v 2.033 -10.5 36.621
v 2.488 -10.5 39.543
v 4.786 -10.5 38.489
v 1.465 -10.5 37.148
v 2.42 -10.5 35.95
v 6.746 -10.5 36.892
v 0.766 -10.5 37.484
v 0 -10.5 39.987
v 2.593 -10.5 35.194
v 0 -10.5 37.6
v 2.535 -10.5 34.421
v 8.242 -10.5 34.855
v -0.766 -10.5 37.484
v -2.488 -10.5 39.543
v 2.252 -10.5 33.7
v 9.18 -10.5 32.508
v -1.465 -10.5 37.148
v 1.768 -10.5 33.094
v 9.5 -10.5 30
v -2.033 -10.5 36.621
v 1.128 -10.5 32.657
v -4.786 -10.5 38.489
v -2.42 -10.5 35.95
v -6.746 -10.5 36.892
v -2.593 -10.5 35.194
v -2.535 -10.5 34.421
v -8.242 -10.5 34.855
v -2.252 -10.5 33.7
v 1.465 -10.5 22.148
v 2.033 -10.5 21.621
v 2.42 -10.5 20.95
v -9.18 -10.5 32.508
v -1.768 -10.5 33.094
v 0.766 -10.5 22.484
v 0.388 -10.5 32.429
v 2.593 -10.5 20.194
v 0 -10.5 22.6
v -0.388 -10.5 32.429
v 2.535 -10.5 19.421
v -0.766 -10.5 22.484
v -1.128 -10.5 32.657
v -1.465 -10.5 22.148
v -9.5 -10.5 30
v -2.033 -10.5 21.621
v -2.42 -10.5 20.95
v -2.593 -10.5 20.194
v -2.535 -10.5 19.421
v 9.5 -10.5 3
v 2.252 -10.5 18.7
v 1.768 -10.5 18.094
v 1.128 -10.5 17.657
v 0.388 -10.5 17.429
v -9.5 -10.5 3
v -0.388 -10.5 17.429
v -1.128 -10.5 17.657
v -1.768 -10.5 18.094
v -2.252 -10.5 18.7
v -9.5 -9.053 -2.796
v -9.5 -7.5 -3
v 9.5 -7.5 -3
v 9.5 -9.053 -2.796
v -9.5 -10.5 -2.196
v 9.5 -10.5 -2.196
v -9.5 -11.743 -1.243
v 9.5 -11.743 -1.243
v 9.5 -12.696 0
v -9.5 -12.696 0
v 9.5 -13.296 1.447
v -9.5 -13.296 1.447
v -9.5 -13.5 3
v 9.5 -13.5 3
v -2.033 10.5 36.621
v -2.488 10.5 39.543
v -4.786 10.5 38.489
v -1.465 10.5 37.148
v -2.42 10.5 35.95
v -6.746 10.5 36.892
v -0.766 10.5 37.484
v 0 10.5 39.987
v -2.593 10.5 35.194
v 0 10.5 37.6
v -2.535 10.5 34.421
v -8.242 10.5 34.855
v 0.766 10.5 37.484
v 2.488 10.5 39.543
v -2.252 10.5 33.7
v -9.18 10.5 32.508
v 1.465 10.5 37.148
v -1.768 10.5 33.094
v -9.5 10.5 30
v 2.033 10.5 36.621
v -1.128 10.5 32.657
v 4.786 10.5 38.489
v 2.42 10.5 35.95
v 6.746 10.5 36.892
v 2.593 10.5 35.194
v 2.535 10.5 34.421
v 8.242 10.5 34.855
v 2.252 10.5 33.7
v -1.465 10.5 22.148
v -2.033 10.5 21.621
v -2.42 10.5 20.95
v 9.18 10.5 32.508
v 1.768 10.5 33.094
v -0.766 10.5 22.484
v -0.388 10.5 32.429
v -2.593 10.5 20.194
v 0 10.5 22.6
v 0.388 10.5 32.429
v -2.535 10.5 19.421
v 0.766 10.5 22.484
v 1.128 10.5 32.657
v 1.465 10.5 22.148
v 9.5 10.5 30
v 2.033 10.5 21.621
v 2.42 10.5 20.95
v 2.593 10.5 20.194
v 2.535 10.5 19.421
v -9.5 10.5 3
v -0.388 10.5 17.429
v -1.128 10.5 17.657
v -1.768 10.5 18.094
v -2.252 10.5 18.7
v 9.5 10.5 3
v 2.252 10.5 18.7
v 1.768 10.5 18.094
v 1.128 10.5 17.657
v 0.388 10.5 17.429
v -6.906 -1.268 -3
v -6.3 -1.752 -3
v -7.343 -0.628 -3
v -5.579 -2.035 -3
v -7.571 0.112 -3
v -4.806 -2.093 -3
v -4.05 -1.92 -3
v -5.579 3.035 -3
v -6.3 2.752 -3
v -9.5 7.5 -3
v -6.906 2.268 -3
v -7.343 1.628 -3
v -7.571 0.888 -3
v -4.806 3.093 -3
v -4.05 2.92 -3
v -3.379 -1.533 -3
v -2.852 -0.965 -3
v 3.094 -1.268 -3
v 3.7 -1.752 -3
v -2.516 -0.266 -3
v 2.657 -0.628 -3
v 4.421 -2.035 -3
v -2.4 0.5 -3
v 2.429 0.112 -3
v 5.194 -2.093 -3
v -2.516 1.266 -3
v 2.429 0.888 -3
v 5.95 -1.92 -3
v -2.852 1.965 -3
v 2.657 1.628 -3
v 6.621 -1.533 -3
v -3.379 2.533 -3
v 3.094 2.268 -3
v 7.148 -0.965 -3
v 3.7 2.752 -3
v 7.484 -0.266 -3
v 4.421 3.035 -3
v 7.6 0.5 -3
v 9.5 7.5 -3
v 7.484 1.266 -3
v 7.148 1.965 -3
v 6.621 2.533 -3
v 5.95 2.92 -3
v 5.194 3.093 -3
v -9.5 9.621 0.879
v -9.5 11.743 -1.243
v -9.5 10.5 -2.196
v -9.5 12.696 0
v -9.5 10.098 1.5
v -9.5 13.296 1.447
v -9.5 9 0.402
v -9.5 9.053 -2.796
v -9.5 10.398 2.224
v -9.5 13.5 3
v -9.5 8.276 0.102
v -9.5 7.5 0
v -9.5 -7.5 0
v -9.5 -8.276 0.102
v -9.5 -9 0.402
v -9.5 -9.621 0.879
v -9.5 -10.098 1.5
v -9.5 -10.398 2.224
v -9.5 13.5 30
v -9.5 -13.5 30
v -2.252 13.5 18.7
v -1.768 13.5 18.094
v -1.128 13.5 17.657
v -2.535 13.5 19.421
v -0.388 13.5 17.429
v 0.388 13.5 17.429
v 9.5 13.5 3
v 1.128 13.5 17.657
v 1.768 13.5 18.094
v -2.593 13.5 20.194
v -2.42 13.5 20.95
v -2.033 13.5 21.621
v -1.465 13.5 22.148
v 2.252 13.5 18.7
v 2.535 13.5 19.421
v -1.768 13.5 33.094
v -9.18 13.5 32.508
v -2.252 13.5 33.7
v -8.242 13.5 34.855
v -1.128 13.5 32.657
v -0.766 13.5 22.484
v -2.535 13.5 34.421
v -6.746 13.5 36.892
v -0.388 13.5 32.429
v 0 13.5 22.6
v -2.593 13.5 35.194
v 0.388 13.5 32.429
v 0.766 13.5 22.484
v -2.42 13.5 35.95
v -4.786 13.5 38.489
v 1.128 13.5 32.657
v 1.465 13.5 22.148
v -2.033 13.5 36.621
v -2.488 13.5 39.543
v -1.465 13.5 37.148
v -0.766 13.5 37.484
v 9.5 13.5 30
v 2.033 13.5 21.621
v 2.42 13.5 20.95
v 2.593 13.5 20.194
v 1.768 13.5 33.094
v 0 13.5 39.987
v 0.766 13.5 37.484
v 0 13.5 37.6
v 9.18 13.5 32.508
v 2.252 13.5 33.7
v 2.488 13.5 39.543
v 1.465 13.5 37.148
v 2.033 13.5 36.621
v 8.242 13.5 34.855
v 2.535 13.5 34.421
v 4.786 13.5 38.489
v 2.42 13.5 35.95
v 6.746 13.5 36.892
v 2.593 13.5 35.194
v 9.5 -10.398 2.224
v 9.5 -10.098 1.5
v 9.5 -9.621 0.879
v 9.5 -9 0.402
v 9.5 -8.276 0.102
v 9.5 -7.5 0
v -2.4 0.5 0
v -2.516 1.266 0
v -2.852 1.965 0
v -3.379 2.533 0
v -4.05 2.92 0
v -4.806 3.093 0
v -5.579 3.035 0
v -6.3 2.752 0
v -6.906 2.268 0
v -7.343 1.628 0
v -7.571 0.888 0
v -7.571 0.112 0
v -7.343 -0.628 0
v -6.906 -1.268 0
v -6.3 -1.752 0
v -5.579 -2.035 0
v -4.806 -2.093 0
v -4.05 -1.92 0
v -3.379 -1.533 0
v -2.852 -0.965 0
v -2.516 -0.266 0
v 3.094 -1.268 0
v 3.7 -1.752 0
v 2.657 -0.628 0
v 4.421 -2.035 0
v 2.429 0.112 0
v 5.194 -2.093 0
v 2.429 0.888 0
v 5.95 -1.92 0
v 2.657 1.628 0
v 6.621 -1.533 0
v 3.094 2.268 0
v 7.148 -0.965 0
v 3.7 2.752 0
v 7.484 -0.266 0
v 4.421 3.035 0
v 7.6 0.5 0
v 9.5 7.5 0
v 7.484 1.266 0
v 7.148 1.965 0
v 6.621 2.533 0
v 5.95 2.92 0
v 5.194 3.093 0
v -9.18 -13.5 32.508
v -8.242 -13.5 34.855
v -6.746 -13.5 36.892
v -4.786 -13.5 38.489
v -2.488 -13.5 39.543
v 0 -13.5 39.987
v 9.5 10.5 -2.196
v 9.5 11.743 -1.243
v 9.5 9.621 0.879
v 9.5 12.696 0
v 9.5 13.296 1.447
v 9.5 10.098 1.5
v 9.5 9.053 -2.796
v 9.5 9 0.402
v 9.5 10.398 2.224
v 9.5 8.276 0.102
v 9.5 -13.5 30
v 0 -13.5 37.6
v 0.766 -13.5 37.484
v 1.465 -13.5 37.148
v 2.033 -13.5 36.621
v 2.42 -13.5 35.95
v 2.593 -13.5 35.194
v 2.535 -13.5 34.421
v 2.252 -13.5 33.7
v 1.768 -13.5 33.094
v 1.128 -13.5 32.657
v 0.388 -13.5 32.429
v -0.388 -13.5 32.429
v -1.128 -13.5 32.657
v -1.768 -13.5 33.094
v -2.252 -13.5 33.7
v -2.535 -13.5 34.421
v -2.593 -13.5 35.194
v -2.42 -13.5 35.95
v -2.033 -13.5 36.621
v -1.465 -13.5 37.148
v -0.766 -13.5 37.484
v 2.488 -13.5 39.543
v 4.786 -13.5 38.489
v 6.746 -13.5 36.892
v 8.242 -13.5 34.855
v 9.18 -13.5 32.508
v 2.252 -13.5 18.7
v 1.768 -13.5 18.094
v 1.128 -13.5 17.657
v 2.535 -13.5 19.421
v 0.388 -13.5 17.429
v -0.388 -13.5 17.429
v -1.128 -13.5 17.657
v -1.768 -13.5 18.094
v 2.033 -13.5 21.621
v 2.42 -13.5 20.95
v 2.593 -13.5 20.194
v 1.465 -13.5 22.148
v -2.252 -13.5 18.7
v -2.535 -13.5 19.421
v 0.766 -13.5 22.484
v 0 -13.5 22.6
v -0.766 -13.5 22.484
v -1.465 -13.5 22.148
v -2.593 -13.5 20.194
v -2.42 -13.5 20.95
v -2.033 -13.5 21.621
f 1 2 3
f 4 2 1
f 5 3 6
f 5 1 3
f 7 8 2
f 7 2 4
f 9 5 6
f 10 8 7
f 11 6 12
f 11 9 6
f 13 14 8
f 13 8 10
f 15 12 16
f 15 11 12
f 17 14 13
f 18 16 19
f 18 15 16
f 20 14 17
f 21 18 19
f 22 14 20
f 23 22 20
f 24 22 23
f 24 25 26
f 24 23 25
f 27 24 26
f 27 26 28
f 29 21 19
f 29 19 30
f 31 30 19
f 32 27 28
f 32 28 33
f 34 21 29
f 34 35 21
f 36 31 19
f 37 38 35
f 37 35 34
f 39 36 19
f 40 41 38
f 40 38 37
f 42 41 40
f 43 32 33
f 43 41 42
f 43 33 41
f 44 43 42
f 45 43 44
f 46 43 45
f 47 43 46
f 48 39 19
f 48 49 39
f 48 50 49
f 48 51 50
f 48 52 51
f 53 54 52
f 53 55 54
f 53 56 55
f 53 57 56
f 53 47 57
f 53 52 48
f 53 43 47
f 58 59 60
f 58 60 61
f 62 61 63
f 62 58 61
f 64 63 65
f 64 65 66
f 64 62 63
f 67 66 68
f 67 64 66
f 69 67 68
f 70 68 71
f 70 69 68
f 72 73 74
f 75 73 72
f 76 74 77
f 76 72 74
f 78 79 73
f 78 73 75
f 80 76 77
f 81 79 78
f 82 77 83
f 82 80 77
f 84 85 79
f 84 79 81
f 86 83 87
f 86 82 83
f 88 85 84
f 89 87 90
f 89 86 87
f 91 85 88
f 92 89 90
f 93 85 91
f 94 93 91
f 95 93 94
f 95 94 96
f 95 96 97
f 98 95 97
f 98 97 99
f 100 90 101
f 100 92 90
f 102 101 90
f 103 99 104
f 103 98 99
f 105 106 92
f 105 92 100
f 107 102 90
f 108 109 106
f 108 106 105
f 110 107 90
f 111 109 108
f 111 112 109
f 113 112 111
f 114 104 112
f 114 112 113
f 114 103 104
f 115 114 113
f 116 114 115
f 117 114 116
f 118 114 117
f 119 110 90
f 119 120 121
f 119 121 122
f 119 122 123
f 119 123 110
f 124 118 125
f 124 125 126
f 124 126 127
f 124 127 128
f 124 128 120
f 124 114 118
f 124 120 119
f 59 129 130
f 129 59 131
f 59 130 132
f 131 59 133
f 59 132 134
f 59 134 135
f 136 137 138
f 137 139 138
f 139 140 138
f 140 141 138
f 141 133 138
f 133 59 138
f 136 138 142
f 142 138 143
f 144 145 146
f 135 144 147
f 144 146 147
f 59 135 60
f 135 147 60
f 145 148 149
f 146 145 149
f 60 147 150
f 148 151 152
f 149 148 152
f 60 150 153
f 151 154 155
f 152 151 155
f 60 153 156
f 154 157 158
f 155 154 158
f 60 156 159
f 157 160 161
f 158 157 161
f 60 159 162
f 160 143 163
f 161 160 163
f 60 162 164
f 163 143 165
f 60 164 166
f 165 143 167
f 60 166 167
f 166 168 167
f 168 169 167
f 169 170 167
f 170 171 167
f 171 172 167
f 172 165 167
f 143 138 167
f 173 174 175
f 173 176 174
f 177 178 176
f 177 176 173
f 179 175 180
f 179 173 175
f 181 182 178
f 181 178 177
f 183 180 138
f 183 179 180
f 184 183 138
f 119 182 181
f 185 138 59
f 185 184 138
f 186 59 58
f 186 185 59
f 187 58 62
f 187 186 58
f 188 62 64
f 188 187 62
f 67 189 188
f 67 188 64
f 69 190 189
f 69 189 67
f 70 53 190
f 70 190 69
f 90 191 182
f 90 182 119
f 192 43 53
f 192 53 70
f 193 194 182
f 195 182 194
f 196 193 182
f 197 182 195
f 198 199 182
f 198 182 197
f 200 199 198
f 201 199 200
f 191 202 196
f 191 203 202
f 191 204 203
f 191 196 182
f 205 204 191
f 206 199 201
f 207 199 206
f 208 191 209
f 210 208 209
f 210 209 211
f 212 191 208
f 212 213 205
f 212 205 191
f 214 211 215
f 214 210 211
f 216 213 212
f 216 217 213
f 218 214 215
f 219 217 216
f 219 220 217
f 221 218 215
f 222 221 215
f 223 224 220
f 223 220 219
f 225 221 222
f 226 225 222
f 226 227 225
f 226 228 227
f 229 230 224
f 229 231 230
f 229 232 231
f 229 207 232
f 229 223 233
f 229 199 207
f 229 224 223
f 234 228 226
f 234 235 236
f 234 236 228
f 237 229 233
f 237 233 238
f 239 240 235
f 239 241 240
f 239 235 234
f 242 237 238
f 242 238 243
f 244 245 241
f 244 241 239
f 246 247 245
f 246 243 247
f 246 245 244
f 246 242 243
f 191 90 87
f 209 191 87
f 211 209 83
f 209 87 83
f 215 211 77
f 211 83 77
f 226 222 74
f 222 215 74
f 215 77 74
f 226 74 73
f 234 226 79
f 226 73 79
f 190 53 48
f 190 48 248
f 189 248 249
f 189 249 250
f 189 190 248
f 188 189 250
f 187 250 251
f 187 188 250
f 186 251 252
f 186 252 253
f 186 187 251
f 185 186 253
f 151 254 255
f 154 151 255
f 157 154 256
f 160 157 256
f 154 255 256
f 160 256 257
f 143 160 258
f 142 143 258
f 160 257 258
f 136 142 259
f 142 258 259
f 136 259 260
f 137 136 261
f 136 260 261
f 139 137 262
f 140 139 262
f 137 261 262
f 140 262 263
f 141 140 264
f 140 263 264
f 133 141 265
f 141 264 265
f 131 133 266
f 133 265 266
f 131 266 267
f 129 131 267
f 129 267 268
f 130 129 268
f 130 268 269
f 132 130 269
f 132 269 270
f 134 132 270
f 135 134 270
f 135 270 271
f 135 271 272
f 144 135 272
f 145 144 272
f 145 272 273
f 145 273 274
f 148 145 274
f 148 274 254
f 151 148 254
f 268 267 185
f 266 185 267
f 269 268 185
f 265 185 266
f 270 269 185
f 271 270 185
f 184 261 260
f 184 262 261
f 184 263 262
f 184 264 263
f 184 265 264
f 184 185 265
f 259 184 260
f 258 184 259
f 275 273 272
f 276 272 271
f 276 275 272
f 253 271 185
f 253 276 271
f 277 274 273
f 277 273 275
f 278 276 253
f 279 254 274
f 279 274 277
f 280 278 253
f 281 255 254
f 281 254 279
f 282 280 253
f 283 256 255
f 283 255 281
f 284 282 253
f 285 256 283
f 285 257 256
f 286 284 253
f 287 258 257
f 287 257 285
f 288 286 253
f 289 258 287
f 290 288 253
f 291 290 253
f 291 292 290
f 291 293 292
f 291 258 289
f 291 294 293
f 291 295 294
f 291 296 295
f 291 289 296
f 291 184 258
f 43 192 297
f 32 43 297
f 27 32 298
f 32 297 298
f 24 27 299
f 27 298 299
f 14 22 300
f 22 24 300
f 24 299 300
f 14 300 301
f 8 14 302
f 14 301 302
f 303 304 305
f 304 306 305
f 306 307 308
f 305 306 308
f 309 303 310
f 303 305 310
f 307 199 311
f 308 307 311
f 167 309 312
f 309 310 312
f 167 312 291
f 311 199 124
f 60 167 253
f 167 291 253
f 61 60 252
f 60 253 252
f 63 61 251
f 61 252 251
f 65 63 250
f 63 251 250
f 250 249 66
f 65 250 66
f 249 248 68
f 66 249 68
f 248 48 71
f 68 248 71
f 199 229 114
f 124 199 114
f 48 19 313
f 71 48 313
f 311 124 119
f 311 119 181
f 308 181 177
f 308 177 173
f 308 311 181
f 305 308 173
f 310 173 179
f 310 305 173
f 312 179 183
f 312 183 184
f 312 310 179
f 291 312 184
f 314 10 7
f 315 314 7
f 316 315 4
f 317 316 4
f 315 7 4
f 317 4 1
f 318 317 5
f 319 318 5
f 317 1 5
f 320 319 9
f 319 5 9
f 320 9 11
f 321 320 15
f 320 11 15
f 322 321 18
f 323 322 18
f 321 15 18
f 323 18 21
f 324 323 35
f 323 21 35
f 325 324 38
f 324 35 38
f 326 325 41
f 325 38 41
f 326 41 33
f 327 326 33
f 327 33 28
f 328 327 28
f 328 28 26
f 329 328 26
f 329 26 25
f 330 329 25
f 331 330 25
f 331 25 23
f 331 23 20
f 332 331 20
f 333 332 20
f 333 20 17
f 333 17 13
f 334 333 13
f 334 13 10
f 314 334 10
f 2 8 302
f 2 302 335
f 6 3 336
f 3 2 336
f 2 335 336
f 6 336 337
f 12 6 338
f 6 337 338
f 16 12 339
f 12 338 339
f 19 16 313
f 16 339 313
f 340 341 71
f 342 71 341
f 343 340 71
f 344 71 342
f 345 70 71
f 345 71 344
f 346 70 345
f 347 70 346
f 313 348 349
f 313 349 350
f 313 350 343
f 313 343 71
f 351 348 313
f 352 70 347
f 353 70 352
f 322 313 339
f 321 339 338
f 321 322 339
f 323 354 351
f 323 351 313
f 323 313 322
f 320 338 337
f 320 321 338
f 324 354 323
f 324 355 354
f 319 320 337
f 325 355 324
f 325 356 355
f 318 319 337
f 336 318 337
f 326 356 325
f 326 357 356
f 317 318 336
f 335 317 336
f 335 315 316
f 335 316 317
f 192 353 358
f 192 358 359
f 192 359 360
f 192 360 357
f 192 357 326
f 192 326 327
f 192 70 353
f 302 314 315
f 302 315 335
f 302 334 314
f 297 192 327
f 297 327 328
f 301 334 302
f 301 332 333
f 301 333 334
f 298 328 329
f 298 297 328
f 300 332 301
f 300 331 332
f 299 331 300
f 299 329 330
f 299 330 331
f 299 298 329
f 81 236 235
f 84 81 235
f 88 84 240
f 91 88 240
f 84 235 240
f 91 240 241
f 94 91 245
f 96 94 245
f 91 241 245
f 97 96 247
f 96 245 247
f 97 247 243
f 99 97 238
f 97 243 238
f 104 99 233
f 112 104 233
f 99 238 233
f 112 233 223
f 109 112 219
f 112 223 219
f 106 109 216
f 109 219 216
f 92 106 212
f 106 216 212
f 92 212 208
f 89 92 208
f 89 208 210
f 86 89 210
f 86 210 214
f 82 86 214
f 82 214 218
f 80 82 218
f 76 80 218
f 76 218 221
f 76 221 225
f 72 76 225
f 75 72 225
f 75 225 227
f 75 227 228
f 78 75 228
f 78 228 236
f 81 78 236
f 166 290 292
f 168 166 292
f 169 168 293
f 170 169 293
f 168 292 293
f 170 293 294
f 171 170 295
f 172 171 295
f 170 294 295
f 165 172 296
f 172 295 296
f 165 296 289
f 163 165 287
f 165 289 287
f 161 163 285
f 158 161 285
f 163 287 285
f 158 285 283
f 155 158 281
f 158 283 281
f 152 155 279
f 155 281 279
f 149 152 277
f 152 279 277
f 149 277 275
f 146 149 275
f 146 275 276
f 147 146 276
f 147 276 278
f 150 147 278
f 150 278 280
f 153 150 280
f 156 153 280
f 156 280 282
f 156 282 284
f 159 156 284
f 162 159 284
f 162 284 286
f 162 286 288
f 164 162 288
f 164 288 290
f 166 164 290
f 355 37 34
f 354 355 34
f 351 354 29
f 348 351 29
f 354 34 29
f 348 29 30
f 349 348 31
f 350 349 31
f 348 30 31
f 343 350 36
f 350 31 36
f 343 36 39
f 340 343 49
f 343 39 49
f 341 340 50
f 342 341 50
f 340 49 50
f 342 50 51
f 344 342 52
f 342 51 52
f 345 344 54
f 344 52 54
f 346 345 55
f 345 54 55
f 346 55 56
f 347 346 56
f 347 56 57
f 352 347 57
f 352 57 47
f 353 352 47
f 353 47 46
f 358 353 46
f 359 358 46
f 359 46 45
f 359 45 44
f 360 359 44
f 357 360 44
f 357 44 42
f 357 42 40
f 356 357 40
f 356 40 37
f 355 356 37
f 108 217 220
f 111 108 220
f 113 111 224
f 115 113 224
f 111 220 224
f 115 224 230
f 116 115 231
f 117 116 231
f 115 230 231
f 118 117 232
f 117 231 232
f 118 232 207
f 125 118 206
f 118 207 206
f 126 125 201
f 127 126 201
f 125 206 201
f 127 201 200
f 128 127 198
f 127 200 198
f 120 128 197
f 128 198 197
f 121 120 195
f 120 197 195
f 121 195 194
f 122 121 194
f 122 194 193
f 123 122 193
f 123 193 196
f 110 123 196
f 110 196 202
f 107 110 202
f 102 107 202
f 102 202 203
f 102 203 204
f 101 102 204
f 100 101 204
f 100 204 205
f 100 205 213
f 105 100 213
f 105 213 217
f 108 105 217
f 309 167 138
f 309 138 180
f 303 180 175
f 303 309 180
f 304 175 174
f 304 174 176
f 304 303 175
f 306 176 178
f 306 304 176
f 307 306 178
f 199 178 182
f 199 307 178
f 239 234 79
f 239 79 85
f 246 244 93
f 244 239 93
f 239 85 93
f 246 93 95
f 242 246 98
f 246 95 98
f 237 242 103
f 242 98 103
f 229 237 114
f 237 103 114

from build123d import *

# Parameters (mm, degrees)
SKETCH1_W                      = 19
SKETCH1_H                      = 27
BASE_FLANGE1_DEPTH             = 3
EDGE_FLANGE1_STRIP_W           = 18
EDGE_FLANGE1_STRIP_H           = 3
EDGE_FLANGE1_STRIP_CUT_DEPTH   = 19
EDGE_FLANGE1_STRIP_2_W         = 18
EDGE_FLANGE1_STRIP_2_H         = 3
EDGE_FLANGE1_STRIP_CUT_2_DEPTH = 19
EDGE_FLANGE1_DEPTH             = 19
EDGE_FLANGE1_BEND_DEPTH        = 19
SKETCH12_R                     = 2.6
CUT_EXTRUDE1_DEPTH             = 10
SKETCH13_R                     = 2.6
CUT_EXTRUDE2_DEPTH             = 50.185871955
FILLET1_R                      = 10


# Sheet-metal steps are written as plain solids
with BuildPart() as part:
    # Sketch1 → Base-Flange1 (new body)
    with BuildSketch(Plane.XY):
        Rectangle(SKETCH1_W, SKETCH1_H)
    extrude(amount=-BASE_FLANGE1_DEPTH)

    # Edge-Flange1 strip (across the edge) → Edge-Flange1 strip cut (cut)
    with BuildSketch(Plane(origin=(9.5, 13.5, 0), x_dir=(0, -1, 0), z_dir=(-1, 0, 0))):
        with Locations((-3, -1.5)):
            Rectangle(EDGE_FLANGE1_STRIP_W, EDGE_FLANGE1_STRIP_H)
    extrude(amount=EDGE_FLANGE1_STRIP_CUT_DEPTH, mode=Mode.SUBTRACT)

    # Edge-Flange1 strip 2 (across the edge) → Edge-Flange1 strip cut 2 (cut)
    with BuildSketch(Plane(origin=(-9.5, -13.5, 0), x_dir=(0, 1, 0), z_dir=(1, 0, 0))):
        with Locations((-3, -1.5)):
            Rectangle(EDGE_FLANGE1_STRIP_2_W, EDGE_FLANGE1_STRIP_2_H)
    extrude(amount=EDGE_FLANGE1_STRIP_CUT_2_DEPTH, mode=Mode.SUBTRACT)

    # Edge-Flange1 section (across the edge) → Edge-Flange1 (add)
    with BuildSketch(Plane(origin=(9.5, 13.5, 0), x_dir=(0, -1, 0), z_dir=(-1, 0, 0))):
        with BuildLine():
            Line((0, 3), (0, 40))
            Line((0, 40), (3, 40))
            Line((3, 40), (3, 3))
            ThreePointArc((3, 3), (3.878679656, 0.878679656), (6, 0))
            Line((6, 0), (6, -3))
            ThreePointArc((6, -3), (1.757359313, -1.242640687), (0, 3))
        make_face()
    extrude(amount=EDGE_FLANGE1_DEPTH)

    # Edge-Flange1 section 2 (across the edge) → Edge-Flange1 bend (add)
    with BuildSketch(Plane(origin=(-9.5, -13.5, 0), x_dir=(0, 1, 0), z_dir=(1, 0, 0))):
        with BuildLine():
            Line((0, 3), (0, 40))
            Line((0, 40), (3, 40))
            Line((3, 40), (3, 3))
            ThreePointArc((3, 3), (3.878679656, 0.878679656), (6, 0))
            Line((6, 0), (6, -3))
            ThreePointArc((6, -3), (1.757359313, -1.242640687), (0, 3))
        make_face()
    extrude(amount=EDGE_FLANGE1_BEND_DEPTH)

    # Sketch12 → Cut-Extrude1 (cut)
    with BuildSketch(Plane.XY):
        with Locations((5, 0.5)):
            Circle(SKETCH12_R)
        with Locations((-5, 0.5)):
            Circle(SKETCH12_R)
    extrude(amount=-CUT_EXTRUDE1_DEPTH, mode=Mode.SUBTRACT)

    # Sketch13 → Cut-Extrude2 (cut, through all)
    with BuildSketch(Plane(origin=(0, 13.5, 0), x_dir=(1, 0, 0), z_dir=(0, 1, 0))):
        with Locations(Location((0, -35, 0), (0, 0, 270))):
            Circle(SKETCH13_R)
        with Locations(Location((0, -20, 0), (0, 0, 270))):
            Circle(SKETCH13_R)
    extrude(amount=-CUT_EXTRUDE2_DEPTH, mode=Mode.SUBTRACT)

    # Fillet1
    # the kernel refuses this fillet: 10 mm, written as the material it takes off along each edge
    with BuildSketch(Plane(origin=(-9.5, -38.5, 40), x_dir=(0, 0, -1), z_dir=(0, 1, 0)), Plane(origin=(9.5, -38.5, 40), x_dir=(-1, 0, 0), z_dir=(0, 1, 0))) as fillet1_piece_1:
        with BuildLine():
            CenterArc((FILLET1_R, -FILLET1_R), FILLET1_R, 90, 90)
            Line((0, -FILLET1_R), (0, 0))
            Line((0, 0), (FILLET1_R, 0))
        make_face()
    extrude(amount=53, mode=Mode.SUBTRACT)
    with BuildSketch(Plane(origin=(-9.5, 38.5, 40), x_dir=(0, 0, -1), z_dir=(0, -1, 0)), Plane(origin=(9.5, 38.5, 40), x_dir=(-1, 0, 0), z_dir=(0, -1, 0))) as fillet1_piece_2:
        with BuildLine():
            CenterArc((FILLET1_R, FILLET1_R), FILLET1_R, 180, 90)
            Line((0, FILLET1_R), (0, 0))
            Line((0, 0), (FILLET1_R, 0))
        make_face()
    extrude(amount=53, mode=Mode.SUBTRACT)


solid = part.part
